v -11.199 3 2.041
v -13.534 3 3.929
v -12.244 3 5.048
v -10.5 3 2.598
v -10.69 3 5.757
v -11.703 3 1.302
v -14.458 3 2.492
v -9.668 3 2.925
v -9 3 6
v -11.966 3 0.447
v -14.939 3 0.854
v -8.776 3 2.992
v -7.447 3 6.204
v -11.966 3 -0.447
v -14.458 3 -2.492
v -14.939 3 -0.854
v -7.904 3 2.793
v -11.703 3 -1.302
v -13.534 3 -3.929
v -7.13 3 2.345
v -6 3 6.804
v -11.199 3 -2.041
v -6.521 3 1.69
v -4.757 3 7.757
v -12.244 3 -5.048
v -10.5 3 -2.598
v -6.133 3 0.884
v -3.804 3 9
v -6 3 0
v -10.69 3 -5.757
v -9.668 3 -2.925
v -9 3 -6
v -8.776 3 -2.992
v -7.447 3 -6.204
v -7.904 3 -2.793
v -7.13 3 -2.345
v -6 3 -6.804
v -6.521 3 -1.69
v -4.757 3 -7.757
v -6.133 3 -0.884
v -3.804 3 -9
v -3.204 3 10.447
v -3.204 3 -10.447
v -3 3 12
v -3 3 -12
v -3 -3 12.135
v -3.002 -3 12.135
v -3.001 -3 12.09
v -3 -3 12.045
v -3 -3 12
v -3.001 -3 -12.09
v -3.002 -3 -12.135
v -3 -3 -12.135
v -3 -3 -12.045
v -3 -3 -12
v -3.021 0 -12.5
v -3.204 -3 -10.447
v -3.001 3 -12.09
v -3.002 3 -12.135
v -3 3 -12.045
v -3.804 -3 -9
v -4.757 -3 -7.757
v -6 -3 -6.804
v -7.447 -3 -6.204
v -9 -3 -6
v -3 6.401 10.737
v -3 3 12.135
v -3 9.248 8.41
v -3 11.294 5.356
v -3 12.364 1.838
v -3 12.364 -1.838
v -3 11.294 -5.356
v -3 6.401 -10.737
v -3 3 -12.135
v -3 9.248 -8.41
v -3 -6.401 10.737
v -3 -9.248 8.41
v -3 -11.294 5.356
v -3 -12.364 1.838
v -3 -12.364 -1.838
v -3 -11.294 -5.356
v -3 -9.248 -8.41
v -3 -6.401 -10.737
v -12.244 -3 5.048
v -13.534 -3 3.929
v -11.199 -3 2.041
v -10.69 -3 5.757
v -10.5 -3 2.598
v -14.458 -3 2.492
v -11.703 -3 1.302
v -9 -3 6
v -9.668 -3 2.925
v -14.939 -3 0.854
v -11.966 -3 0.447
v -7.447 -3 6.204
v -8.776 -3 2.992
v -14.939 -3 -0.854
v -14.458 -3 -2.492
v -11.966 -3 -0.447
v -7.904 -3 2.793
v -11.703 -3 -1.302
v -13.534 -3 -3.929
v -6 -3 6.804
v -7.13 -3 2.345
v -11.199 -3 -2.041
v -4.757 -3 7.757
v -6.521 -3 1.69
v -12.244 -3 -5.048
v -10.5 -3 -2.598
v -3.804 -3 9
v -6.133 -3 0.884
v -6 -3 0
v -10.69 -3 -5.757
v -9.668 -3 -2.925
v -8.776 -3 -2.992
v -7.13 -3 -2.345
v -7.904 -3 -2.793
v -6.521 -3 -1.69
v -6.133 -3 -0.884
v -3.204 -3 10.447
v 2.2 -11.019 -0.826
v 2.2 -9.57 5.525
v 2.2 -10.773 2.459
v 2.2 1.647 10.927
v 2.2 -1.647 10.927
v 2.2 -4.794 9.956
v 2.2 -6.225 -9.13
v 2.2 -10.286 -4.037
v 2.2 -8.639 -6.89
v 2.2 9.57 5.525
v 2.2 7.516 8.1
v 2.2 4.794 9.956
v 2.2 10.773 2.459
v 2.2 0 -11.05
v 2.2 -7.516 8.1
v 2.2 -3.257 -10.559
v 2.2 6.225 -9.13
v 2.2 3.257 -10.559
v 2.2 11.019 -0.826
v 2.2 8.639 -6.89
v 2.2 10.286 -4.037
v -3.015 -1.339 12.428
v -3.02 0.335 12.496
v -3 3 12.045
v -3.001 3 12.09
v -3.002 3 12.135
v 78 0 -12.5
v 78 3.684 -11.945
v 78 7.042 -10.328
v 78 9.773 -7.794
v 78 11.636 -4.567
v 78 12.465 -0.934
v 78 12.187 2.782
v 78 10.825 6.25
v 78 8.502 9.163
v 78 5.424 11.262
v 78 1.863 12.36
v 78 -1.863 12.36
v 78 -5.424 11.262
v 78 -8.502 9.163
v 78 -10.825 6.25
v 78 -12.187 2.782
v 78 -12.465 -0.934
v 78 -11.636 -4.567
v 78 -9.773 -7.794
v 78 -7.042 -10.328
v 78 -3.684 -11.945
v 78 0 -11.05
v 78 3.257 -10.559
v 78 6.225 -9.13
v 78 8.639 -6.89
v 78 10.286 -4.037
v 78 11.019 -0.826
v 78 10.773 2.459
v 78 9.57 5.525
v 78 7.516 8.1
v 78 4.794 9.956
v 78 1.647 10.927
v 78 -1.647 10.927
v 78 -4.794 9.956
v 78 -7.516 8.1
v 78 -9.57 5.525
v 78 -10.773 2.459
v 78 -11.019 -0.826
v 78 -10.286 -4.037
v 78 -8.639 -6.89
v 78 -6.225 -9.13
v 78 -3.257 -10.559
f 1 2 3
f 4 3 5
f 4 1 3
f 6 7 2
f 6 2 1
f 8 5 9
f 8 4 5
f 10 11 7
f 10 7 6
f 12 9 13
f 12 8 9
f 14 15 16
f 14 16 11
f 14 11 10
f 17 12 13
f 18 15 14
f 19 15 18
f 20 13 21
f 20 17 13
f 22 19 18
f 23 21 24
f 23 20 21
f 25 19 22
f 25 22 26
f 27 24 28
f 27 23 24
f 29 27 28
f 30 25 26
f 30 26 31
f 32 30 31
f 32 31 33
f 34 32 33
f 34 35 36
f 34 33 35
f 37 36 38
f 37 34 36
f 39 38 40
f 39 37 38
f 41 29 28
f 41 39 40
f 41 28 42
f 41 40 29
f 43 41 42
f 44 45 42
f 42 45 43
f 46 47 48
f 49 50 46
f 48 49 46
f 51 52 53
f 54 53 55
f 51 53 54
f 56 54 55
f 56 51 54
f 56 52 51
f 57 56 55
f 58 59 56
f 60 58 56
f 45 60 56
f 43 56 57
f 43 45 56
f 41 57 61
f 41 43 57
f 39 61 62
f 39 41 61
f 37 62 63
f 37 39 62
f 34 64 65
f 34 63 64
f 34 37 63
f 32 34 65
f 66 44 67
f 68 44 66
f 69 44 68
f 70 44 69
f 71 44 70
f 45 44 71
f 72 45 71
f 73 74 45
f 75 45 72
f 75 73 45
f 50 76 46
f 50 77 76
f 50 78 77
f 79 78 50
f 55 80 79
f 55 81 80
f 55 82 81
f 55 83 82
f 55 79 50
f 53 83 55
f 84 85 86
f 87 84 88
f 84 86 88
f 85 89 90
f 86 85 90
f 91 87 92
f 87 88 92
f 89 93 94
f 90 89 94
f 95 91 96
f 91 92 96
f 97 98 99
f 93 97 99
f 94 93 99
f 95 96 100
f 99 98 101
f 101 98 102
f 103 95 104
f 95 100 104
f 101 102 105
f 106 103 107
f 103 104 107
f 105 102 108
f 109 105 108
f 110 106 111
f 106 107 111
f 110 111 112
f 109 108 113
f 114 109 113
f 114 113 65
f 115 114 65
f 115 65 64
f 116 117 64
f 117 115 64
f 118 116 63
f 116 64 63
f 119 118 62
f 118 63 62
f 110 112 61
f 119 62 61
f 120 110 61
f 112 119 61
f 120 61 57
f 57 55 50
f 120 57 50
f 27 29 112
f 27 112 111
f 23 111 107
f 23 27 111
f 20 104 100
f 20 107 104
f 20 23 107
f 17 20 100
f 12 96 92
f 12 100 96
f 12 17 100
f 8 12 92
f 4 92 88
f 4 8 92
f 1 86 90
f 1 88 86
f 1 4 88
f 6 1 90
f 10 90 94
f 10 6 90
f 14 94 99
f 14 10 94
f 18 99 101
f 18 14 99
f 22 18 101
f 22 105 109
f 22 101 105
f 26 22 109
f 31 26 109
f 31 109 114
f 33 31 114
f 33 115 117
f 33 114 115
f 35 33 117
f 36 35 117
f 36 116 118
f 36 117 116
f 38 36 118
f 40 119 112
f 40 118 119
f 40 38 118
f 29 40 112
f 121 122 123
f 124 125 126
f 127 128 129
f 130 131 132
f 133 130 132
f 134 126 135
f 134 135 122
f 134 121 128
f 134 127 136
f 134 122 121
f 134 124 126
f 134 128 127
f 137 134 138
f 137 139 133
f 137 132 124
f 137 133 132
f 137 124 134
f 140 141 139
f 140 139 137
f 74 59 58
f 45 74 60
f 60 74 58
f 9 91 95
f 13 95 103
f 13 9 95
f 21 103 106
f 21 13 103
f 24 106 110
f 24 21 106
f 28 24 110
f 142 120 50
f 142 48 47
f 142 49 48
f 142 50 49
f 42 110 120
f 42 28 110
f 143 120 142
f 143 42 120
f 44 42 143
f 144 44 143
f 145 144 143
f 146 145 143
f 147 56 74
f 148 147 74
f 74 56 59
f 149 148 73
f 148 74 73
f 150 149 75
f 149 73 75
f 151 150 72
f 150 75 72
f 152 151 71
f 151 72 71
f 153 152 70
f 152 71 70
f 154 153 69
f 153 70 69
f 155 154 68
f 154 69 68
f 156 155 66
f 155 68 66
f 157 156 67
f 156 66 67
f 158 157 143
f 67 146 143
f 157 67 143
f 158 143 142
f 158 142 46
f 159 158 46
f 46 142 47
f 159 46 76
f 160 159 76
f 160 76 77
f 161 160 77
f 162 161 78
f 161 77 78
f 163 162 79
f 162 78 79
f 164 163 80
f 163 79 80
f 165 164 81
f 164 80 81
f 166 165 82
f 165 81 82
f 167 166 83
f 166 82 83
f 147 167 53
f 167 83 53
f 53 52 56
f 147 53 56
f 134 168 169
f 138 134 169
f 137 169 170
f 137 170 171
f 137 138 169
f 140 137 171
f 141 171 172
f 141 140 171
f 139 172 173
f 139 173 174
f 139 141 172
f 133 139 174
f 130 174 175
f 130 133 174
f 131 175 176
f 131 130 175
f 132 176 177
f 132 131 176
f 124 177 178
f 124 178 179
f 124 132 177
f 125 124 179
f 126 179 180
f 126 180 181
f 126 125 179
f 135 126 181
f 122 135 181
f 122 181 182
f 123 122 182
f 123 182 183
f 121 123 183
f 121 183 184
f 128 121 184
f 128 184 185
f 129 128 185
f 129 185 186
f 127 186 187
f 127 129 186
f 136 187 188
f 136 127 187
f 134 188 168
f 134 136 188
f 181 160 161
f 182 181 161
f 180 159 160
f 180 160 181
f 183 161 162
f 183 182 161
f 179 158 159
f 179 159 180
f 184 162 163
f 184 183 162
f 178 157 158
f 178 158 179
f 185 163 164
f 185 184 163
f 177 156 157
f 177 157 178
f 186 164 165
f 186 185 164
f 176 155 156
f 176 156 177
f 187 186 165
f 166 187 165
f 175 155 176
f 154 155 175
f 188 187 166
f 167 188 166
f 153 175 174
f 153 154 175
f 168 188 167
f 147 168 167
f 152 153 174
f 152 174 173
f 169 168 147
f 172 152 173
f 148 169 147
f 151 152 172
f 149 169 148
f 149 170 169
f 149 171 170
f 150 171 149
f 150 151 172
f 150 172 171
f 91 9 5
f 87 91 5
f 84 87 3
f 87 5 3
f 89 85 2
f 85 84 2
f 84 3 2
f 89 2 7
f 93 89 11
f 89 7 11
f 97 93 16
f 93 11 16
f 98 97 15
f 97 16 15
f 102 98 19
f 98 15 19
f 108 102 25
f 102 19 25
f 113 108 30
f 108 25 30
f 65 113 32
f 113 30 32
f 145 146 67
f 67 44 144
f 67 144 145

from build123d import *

# Parameters (mm, degrees)
CYLINDER071_R           = 6
CYLINDER071_DEPTH       = 10
CYLINDER071_ROLL_ANGLE  = 90
CYLINDER072_R           = 6
CYLINDER072_DEPTH       = 10
CYLINDER072_ROLL_ANGLE  = 90
BOX003_W                = 6
BOX003_H                = 10
BOX003_DEPTH            = 38
BOX002_W                = 14
BOX002_H                = 10
BOX002_DEPTH            = 38
CYLINDER070_R           = 6
CYLINDER070_DEPTH       = 10
CYLINDER070_ROLL_ANGLE  = 90
CYLINDER006_R           = 11.05
CYLINDER006_DEPTH       = 75.8
CYLINDER006_PITCH_ANGLE = 90
CYLINDER018_R           = 3
CYLINDER018_DEPTH       = 30
CYLINDER018_ROLL_ANGLE  = 90
BOX001_W                = 14
BOX001_H                = 15
BOX001_DEPTH            = 30
BOX_W                   = 14
BOX_H                   = 15
BOX_DEPTH               = 30
CYLINDER005_R           = 12.5
CYLINDER005_DEPTH       = 95
CYLINDER005_PITCH_ANGLE = 90


with BuildPart() as cylinder076:
    # Cylinder071 → Cylinder071 (new body)
    with BuildSketch(Plane.XY):
        Circle(CYLINDER071_R)
    extrude(amount=CYLINDER071_DEPTH)


with BuildPart() as cylinder076_1:
    # Cylinder071 roll: moved
    add(cylinder076.part.rotate(Axis((0, 0, 0), (1, 0, 0)), CYLINDER071_ROLL_ANGLE))


with BuildPart() as cylinder076_2:
    # Cylinder071 placement: moved
    add(cylinder076_1.part.moved(Location((-9, 5, -12))))


with BuildPart() as cylinder077:
    # Cylinder072 → Cylinder072 (new body)
    with BuildSketch(Plane.XY):
        Circle(CYLINDER072_R)
    extrude(amount=CYLINDER072_DEPTH)


with BuildPart() as cylinder077_1:
    # Cylinder072 roll: moved
    add(cylinder077.part.rotate(Axis((0, 0, 0), (1, 0, 0)), CYLINDER072_ROLL_ANGLE))


with BuildPart() as cylinder077_2:
    # Cylinder072 placement: moved
    add(cylinder077_1.part.moved(Location((-9, 5, 0))))


with BuildPart() as cube003:
    # Box003 → Box003 (new body)
    with BuildSketch(Plane(origin=(-9, -5, -19), x_dir=(1, 0, 0), z_dir=(0, 0, 1))):
        with Locations((3, 5)):
            Rectangle(BOX003_W, BOX003_H)
    extrude(amount=BOX003_DEPTH)


with BuildPart() as cut065:
    # Box002 → Box002 (new body)
    with BuildSketch(Plane(origin=(-17, -5, -19), x_dir=(1, 0, 0), z_dir=(0, 0, 1))):
        with Locations((7, 5)):
            Rectangle(BOX002_W, BOX002_H)
    extrude(amount=BOX002_DEPTH)

    # Cut064: cut Cube003
    add(cube003.part, mode=Mode.SUBTRACT)

    # Cut065: cut Cylinder077
    add(cylinder077_2.part, mode=Mode.SUBTRACT)


with BuildPart() as fusion015:
    # Cylinder070 → Cylinder070 (new body)
    with BuildSketch(Plane.XY):
        Circle(CYLINDER070_R)
    extrude(amount=CYLINDER070_DEPTH)


with BuildPart() as fusion015_1:
    # Cylinder070 roll: moved
    add(fusion015.part.rotate(Axis((0, 0, 0), (1, 0, 0)), CYLINDER070_ROLL_ANGLE))


with BuildPart() as fusion015_2:
    # Cylinder070 placement: moved
    add(fusion015_1.part.moved(Location((-9, 5, 12))))

    # Fusion015: union Cylinder076, Cut065
    add(cylinder076_2.part)
    add(cut065.part)


with BuildPart() as cylinder004:
    # Cylinder006 → Cylinder006 (new body)
    with BuildSketch(Plane.XY):
        Circle(CYLINDER006_R)
    extrude(amount=CYLINDER006_DEPTH)


with BuildPart() as cylinder004_1:
    # Cylinder006 pitch: moved
    add(cylinder004.part.rotate(Axis((0, 0, 0), (0, 1, 0)), CYLINDER006_PITCH_ANGLE))


with BuildPart() as cylinder004_2:
    # Cylinder006 placement: moved
    add(cylinder004_1.part.moved(Location((2.2, 0, 0))))


with BuildPart() as cylinder016:
    # Cylinder018 → Cylinder018 (new body)
    with BuildSketch(Plane.XY):
        Circle(CYLINDER018_R)
    extrude(amount=CYLINDER018_DEPTH)


with BuildPart() as cylinder016_1:
    # Cylinder018 roll: moved
    add(cylinder016.part.rotate(Axis((0, 0, 0), (1, 0, 0)), CYLINDER018_ROLL_ANGLE))


with BuildPart() as cylinder016_2:
    # Cylinder018 placement: moved
    add(cylinder016_1.part.moved(Location((-9, 15, 0))))


with BuildPart() as cube001:
    # Box001 → Box001 (new body)
    with BuildSketch(Plane(origin=(-17, -18, -15), x_dir=(1, 0, 0), z_dir=(0, 0, 1))):
        with Locations((7, 7.5)):
            Rectangle(BOX001_W, BOX001_H)
    extrude(amount=BOX001_DEPTH)


with BuildPart() as cube:
    # Box → Box (new body)
    with BuildSketch(Plane(origin=(-17, 3, -15), x_dir=(1, 0, 0), z_dir=(0, 0, 1))):
        with Locations((7, 7.5)):
            Rectangle(BOX_W, BOX_H)
    extrude(amount=BOX_DEPTH)


with BuildPart() as batterycap2:
    # Cylinder005 → Cylinder005 (new body)
    with BuildSketch(Plane.XY):
        Circle(CYLINDER005_R)
    extrude(amount=CYLINDER005_DEPTH)


with BuildPart() as batterycap2_1:
    # Cylinder005 pitch: moved
    add(batterycap2.part.rotate(Axis((0, 0, 0), (0, 1, 0)), CYLINDER005_PITCH_ANGLE))


with BuildPart() as batterycap2_2:
    # Cylinder005 placement: moved
    add(batterycap2_1.part.moved(Location((-17, 0, 0))))

    # Cut010: cut Cube
    add(cube.part, mode=Mode.SUBTRACT)

    # Cut011: cut Cube001
    add(cube001.part, mode=Mode.SUBTRACT)

    # Cut012: cut Cylinder016
    add(cylinder016_2.part, mode=Mode.SUBTRACT)

    # Cut013: cut Cylinder004
    add(cylinder004_2.part, mode=Mode.SUBTRACT)

    # Cut066: cut Fusion015
    add(fusion015_2.part, mode=Mode.SUBTRACT)


solid = batterycap2_2.part
